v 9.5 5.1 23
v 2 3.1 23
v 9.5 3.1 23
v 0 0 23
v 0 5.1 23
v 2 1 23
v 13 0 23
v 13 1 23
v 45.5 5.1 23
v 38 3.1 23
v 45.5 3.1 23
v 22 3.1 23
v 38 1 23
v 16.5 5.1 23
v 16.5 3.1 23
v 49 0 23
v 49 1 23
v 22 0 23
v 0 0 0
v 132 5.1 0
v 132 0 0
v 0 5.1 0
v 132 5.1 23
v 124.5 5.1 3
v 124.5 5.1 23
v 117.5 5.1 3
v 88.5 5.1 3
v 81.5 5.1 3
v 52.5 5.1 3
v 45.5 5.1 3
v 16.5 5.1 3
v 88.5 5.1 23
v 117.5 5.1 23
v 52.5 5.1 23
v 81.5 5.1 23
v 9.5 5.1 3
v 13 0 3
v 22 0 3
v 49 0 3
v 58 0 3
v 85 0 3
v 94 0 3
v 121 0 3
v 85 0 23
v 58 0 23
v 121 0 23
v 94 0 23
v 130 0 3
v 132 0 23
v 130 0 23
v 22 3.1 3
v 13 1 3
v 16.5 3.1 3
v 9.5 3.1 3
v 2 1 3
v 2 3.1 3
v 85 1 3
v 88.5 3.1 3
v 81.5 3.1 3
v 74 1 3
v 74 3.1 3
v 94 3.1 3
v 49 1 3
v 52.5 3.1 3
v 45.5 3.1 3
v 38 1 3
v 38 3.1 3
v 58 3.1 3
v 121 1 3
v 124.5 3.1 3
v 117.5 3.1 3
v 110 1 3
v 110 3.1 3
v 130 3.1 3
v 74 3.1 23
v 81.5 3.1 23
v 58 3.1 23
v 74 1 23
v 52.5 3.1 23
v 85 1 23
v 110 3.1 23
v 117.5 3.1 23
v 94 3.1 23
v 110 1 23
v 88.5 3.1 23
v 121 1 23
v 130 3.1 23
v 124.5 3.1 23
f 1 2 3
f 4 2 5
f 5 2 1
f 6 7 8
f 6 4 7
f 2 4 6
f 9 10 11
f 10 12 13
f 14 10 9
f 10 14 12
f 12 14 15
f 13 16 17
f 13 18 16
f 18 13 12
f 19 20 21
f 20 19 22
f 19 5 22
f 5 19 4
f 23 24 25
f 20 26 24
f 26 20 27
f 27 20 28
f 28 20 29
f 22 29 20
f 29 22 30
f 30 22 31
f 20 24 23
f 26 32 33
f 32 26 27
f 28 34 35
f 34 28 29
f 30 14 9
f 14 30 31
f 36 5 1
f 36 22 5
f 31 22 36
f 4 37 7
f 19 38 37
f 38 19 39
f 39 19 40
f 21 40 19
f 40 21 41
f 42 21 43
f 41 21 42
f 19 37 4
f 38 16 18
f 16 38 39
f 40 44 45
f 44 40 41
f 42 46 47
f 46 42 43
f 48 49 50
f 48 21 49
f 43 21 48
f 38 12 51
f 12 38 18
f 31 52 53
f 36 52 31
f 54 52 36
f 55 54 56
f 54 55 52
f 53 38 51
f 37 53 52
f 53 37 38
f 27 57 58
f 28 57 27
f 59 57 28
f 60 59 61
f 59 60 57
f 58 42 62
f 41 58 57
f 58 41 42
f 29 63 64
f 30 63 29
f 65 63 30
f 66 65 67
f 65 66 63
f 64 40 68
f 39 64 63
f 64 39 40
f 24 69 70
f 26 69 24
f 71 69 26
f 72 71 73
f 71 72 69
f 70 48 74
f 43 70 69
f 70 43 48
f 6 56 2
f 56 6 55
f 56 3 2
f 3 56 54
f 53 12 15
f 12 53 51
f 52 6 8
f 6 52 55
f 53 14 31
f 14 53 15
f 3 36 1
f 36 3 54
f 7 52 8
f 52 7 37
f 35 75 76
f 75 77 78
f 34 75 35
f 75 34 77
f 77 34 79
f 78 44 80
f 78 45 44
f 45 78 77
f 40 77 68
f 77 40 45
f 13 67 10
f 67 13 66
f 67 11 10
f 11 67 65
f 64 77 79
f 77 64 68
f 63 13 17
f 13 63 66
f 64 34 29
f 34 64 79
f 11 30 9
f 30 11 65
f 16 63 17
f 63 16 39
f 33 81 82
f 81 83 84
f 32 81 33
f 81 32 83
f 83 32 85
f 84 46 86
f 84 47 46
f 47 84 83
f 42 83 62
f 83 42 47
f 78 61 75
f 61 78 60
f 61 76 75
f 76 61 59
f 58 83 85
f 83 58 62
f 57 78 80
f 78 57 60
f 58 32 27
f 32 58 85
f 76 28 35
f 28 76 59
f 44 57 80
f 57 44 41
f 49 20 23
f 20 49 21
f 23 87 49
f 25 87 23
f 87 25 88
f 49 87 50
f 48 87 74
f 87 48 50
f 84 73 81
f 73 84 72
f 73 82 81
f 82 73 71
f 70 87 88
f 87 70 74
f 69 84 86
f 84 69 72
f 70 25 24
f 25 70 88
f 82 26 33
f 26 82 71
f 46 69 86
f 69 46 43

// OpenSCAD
piso = 3;
altura = 20;
alturaTotal = altura + piso;

module cam() {
    difference () {
        cube ([24,5.1,alturaTotal]);
        translate ([2,1,piso])
        cube ([20,2.1,altura]);
        translate ([9.5,3,piso])
        cube ([7,2.2,altura]);
        translate ([13,0,piso])
        cube ([9,2.2,altura]);
//        translate ([13-7,0,piso])
//        cube ([9,1,altura]);   
    }
}


union() {
    cube([36*4 - 12, 5.1, piso]);
    for (a =[0:3]) {
        translate([36*a,0,0])
        cam();
    }
    for (a =[0:2]) {
        translate([a*36 + 24, 0, 0])
        cube([36-24, 5.1, alturaTotal]);
    }
}
